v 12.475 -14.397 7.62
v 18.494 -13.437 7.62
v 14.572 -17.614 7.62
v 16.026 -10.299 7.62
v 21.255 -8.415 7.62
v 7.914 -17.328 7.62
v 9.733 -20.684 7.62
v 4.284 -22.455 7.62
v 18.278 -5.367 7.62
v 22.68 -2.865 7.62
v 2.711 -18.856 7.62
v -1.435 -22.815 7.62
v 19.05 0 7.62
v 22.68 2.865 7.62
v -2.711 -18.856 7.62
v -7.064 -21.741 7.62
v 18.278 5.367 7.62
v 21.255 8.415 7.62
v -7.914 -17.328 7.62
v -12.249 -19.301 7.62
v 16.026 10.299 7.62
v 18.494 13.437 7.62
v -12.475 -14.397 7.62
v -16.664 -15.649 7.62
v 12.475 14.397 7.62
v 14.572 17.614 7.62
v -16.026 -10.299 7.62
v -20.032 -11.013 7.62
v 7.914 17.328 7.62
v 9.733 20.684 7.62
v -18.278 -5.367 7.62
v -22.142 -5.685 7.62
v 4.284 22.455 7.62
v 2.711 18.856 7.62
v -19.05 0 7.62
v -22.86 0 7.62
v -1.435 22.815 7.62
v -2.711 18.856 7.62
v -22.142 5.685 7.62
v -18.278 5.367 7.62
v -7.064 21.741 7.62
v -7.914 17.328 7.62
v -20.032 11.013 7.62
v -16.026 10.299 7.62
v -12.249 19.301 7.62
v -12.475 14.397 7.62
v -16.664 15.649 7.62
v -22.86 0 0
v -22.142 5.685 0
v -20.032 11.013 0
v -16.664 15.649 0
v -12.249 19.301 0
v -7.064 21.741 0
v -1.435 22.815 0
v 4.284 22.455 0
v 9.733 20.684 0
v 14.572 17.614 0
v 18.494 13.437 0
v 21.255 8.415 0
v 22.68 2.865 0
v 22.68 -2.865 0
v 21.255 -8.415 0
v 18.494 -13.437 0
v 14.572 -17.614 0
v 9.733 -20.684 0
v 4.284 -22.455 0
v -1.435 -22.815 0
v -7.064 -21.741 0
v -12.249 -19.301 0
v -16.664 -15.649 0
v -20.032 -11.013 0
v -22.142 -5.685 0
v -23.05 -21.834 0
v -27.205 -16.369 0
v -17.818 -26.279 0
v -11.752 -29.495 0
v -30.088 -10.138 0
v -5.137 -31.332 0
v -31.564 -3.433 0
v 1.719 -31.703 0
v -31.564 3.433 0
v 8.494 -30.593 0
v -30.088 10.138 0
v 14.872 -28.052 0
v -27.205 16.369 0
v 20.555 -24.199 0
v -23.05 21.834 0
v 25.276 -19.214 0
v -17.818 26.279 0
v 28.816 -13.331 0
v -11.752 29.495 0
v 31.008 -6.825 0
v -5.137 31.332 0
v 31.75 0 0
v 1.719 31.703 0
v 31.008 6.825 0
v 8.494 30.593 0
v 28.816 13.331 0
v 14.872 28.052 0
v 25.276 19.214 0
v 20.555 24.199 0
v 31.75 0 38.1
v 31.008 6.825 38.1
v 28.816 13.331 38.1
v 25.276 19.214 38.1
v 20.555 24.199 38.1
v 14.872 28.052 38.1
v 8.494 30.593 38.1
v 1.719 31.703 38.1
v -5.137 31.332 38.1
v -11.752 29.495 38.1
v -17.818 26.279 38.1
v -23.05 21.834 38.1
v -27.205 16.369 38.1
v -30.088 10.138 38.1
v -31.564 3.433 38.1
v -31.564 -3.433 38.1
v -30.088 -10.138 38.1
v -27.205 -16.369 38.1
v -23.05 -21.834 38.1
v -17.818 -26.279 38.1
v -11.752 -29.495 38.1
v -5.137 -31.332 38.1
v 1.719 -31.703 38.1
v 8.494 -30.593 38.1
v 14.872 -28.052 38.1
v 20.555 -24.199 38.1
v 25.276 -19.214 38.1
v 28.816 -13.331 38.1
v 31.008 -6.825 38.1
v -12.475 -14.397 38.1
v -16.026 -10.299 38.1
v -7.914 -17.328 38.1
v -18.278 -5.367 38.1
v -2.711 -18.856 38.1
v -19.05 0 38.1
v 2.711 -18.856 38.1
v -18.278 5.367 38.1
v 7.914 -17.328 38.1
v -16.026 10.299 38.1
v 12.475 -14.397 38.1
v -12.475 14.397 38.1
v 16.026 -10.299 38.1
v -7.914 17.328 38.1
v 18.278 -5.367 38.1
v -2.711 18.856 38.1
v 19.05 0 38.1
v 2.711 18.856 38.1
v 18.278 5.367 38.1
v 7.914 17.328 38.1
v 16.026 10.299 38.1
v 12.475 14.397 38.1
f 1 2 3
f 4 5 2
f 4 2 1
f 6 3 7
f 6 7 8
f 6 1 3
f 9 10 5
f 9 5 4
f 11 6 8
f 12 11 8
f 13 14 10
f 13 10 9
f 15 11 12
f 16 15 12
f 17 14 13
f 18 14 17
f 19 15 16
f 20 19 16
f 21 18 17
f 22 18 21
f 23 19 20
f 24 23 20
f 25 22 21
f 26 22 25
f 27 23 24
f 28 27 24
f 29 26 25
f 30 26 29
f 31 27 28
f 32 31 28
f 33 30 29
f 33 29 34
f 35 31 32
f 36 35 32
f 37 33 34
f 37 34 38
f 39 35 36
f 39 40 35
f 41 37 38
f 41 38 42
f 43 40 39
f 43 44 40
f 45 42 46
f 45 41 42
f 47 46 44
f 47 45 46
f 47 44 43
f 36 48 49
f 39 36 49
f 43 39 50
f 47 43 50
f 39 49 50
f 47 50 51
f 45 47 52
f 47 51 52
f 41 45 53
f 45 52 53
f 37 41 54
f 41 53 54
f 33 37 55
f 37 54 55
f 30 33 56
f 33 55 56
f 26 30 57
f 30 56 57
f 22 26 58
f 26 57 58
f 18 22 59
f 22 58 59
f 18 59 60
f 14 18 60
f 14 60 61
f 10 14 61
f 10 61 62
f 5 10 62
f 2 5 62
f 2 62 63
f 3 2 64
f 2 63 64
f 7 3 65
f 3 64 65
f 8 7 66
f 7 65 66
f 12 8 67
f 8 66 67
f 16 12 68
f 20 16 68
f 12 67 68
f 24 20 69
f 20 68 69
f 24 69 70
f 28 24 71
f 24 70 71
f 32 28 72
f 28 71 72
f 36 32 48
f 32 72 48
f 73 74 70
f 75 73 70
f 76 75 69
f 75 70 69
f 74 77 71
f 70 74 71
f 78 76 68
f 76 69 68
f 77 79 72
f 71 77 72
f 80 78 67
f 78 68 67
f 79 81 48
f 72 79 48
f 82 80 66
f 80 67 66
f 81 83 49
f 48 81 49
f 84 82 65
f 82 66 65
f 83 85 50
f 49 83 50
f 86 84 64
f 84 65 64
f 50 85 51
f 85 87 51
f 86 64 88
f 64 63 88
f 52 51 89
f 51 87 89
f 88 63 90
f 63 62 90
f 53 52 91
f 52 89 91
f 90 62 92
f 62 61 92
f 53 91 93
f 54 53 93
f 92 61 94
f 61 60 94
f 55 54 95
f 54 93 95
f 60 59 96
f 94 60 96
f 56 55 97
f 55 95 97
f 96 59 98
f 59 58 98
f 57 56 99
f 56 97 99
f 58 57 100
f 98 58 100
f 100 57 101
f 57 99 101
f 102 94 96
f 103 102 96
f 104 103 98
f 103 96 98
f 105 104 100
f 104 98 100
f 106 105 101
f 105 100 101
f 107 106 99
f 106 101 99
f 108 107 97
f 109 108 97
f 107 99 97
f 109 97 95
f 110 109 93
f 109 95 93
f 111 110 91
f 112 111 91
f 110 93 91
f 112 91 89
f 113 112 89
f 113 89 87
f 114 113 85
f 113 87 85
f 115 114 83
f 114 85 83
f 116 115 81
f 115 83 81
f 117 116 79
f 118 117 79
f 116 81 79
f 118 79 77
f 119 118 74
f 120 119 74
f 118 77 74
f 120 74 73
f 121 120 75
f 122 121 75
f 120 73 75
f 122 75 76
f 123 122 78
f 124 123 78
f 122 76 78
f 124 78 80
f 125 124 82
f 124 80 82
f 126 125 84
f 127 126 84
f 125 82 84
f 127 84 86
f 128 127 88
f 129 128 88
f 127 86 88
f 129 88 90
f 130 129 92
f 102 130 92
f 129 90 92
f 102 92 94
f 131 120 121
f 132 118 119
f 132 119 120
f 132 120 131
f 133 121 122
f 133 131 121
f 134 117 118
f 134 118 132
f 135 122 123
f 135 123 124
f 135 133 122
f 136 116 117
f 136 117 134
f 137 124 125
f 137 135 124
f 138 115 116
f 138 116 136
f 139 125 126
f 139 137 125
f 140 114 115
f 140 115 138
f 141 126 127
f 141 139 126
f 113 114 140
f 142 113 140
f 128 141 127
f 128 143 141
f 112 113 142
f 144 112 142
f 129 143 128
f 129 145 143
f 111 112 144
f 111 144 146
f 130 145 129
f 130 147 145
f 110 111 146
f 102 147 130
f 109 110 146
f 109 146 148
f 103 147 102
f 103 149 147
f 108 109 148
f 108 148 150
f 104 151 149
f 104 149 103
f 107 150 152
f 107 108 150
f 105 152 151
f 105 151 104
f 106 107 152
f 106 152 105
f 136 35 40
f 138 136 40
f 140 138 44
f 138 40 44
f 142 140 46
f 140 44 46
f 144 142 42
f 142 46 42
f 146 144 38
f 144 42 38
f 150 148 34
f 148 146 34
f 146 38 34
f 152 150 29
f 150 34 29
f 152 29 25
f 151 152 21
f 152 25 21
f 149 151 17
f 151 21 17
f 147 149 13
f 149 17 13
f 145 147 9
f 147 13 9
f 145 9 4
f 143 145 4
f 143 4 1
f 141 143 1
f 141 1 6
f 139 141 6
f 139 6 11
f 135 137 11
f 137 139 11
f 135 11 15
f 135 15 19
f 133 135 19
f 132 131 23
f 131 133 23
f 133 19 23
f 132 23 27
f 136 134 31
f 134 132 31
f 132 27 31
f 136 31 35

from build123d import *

# Parameters (mm, degrees)
SKETCH1_R           = 31.75
BOSS_EXTRUDE1_DEPTH = 38.1
SKETCH2_R           = 19.05
CUT_EXTRUDE1_DEPTH  = 12.7
SKETCH3_R           = 19.05
CUT_EXTRUDE2_DEPTH  = 39.1
SKETCH4_R           = 22.86
CUT_EXTRUDE3_DEPTH  = 7.62


with BuildPart() as part:
    # Sketch1 → Boss-Extrude1 (new body)
    with BuildSketch(Plane.XY):
        Circle(SKETCH1_R)
    extrude(amount=BOSS_EXTRUDE1_DEPTH)

    # Sketch2 → Cut-Extrude1 (cut)
    with BuildSketch(Plane(origin=(0, 0, 0), x_dir=(-1, 0, 0), z_dir=(0, 0, -1))):
        Circle(SKETCH2_R)
    extrude(amount=-CUT_EXTRUDE1_DEPTH, mode=Mode.SUBTRACT)

    # Sketch3 → Cut-Extrude2 (cut, through all)
    with BuildSketch(Plane.XY.offset(38.1)):
        with Locations(Location((0, 0, 0), (0, 0, 180))):  # turned: the seam where the file's is
            Circle(SKETCH3_R)
    extrude(amount=-CUT_EXTRUDE2_DEPTH, mode=Mode.SUBTRACT)

    # Sketch4 → Cut-Extrude3 (cut)
    with BuildSketch(Plane(origin=(0, 0, 0), x_dir=(-1, 0, 0), z_dir=(0, 0, -1))):
        Circle(SKETCH4_R)
    extrude(amount=-CUT_EXTRUDE3_DEPTH, mode=Mode.SUBTRACT)


solid = part.part
